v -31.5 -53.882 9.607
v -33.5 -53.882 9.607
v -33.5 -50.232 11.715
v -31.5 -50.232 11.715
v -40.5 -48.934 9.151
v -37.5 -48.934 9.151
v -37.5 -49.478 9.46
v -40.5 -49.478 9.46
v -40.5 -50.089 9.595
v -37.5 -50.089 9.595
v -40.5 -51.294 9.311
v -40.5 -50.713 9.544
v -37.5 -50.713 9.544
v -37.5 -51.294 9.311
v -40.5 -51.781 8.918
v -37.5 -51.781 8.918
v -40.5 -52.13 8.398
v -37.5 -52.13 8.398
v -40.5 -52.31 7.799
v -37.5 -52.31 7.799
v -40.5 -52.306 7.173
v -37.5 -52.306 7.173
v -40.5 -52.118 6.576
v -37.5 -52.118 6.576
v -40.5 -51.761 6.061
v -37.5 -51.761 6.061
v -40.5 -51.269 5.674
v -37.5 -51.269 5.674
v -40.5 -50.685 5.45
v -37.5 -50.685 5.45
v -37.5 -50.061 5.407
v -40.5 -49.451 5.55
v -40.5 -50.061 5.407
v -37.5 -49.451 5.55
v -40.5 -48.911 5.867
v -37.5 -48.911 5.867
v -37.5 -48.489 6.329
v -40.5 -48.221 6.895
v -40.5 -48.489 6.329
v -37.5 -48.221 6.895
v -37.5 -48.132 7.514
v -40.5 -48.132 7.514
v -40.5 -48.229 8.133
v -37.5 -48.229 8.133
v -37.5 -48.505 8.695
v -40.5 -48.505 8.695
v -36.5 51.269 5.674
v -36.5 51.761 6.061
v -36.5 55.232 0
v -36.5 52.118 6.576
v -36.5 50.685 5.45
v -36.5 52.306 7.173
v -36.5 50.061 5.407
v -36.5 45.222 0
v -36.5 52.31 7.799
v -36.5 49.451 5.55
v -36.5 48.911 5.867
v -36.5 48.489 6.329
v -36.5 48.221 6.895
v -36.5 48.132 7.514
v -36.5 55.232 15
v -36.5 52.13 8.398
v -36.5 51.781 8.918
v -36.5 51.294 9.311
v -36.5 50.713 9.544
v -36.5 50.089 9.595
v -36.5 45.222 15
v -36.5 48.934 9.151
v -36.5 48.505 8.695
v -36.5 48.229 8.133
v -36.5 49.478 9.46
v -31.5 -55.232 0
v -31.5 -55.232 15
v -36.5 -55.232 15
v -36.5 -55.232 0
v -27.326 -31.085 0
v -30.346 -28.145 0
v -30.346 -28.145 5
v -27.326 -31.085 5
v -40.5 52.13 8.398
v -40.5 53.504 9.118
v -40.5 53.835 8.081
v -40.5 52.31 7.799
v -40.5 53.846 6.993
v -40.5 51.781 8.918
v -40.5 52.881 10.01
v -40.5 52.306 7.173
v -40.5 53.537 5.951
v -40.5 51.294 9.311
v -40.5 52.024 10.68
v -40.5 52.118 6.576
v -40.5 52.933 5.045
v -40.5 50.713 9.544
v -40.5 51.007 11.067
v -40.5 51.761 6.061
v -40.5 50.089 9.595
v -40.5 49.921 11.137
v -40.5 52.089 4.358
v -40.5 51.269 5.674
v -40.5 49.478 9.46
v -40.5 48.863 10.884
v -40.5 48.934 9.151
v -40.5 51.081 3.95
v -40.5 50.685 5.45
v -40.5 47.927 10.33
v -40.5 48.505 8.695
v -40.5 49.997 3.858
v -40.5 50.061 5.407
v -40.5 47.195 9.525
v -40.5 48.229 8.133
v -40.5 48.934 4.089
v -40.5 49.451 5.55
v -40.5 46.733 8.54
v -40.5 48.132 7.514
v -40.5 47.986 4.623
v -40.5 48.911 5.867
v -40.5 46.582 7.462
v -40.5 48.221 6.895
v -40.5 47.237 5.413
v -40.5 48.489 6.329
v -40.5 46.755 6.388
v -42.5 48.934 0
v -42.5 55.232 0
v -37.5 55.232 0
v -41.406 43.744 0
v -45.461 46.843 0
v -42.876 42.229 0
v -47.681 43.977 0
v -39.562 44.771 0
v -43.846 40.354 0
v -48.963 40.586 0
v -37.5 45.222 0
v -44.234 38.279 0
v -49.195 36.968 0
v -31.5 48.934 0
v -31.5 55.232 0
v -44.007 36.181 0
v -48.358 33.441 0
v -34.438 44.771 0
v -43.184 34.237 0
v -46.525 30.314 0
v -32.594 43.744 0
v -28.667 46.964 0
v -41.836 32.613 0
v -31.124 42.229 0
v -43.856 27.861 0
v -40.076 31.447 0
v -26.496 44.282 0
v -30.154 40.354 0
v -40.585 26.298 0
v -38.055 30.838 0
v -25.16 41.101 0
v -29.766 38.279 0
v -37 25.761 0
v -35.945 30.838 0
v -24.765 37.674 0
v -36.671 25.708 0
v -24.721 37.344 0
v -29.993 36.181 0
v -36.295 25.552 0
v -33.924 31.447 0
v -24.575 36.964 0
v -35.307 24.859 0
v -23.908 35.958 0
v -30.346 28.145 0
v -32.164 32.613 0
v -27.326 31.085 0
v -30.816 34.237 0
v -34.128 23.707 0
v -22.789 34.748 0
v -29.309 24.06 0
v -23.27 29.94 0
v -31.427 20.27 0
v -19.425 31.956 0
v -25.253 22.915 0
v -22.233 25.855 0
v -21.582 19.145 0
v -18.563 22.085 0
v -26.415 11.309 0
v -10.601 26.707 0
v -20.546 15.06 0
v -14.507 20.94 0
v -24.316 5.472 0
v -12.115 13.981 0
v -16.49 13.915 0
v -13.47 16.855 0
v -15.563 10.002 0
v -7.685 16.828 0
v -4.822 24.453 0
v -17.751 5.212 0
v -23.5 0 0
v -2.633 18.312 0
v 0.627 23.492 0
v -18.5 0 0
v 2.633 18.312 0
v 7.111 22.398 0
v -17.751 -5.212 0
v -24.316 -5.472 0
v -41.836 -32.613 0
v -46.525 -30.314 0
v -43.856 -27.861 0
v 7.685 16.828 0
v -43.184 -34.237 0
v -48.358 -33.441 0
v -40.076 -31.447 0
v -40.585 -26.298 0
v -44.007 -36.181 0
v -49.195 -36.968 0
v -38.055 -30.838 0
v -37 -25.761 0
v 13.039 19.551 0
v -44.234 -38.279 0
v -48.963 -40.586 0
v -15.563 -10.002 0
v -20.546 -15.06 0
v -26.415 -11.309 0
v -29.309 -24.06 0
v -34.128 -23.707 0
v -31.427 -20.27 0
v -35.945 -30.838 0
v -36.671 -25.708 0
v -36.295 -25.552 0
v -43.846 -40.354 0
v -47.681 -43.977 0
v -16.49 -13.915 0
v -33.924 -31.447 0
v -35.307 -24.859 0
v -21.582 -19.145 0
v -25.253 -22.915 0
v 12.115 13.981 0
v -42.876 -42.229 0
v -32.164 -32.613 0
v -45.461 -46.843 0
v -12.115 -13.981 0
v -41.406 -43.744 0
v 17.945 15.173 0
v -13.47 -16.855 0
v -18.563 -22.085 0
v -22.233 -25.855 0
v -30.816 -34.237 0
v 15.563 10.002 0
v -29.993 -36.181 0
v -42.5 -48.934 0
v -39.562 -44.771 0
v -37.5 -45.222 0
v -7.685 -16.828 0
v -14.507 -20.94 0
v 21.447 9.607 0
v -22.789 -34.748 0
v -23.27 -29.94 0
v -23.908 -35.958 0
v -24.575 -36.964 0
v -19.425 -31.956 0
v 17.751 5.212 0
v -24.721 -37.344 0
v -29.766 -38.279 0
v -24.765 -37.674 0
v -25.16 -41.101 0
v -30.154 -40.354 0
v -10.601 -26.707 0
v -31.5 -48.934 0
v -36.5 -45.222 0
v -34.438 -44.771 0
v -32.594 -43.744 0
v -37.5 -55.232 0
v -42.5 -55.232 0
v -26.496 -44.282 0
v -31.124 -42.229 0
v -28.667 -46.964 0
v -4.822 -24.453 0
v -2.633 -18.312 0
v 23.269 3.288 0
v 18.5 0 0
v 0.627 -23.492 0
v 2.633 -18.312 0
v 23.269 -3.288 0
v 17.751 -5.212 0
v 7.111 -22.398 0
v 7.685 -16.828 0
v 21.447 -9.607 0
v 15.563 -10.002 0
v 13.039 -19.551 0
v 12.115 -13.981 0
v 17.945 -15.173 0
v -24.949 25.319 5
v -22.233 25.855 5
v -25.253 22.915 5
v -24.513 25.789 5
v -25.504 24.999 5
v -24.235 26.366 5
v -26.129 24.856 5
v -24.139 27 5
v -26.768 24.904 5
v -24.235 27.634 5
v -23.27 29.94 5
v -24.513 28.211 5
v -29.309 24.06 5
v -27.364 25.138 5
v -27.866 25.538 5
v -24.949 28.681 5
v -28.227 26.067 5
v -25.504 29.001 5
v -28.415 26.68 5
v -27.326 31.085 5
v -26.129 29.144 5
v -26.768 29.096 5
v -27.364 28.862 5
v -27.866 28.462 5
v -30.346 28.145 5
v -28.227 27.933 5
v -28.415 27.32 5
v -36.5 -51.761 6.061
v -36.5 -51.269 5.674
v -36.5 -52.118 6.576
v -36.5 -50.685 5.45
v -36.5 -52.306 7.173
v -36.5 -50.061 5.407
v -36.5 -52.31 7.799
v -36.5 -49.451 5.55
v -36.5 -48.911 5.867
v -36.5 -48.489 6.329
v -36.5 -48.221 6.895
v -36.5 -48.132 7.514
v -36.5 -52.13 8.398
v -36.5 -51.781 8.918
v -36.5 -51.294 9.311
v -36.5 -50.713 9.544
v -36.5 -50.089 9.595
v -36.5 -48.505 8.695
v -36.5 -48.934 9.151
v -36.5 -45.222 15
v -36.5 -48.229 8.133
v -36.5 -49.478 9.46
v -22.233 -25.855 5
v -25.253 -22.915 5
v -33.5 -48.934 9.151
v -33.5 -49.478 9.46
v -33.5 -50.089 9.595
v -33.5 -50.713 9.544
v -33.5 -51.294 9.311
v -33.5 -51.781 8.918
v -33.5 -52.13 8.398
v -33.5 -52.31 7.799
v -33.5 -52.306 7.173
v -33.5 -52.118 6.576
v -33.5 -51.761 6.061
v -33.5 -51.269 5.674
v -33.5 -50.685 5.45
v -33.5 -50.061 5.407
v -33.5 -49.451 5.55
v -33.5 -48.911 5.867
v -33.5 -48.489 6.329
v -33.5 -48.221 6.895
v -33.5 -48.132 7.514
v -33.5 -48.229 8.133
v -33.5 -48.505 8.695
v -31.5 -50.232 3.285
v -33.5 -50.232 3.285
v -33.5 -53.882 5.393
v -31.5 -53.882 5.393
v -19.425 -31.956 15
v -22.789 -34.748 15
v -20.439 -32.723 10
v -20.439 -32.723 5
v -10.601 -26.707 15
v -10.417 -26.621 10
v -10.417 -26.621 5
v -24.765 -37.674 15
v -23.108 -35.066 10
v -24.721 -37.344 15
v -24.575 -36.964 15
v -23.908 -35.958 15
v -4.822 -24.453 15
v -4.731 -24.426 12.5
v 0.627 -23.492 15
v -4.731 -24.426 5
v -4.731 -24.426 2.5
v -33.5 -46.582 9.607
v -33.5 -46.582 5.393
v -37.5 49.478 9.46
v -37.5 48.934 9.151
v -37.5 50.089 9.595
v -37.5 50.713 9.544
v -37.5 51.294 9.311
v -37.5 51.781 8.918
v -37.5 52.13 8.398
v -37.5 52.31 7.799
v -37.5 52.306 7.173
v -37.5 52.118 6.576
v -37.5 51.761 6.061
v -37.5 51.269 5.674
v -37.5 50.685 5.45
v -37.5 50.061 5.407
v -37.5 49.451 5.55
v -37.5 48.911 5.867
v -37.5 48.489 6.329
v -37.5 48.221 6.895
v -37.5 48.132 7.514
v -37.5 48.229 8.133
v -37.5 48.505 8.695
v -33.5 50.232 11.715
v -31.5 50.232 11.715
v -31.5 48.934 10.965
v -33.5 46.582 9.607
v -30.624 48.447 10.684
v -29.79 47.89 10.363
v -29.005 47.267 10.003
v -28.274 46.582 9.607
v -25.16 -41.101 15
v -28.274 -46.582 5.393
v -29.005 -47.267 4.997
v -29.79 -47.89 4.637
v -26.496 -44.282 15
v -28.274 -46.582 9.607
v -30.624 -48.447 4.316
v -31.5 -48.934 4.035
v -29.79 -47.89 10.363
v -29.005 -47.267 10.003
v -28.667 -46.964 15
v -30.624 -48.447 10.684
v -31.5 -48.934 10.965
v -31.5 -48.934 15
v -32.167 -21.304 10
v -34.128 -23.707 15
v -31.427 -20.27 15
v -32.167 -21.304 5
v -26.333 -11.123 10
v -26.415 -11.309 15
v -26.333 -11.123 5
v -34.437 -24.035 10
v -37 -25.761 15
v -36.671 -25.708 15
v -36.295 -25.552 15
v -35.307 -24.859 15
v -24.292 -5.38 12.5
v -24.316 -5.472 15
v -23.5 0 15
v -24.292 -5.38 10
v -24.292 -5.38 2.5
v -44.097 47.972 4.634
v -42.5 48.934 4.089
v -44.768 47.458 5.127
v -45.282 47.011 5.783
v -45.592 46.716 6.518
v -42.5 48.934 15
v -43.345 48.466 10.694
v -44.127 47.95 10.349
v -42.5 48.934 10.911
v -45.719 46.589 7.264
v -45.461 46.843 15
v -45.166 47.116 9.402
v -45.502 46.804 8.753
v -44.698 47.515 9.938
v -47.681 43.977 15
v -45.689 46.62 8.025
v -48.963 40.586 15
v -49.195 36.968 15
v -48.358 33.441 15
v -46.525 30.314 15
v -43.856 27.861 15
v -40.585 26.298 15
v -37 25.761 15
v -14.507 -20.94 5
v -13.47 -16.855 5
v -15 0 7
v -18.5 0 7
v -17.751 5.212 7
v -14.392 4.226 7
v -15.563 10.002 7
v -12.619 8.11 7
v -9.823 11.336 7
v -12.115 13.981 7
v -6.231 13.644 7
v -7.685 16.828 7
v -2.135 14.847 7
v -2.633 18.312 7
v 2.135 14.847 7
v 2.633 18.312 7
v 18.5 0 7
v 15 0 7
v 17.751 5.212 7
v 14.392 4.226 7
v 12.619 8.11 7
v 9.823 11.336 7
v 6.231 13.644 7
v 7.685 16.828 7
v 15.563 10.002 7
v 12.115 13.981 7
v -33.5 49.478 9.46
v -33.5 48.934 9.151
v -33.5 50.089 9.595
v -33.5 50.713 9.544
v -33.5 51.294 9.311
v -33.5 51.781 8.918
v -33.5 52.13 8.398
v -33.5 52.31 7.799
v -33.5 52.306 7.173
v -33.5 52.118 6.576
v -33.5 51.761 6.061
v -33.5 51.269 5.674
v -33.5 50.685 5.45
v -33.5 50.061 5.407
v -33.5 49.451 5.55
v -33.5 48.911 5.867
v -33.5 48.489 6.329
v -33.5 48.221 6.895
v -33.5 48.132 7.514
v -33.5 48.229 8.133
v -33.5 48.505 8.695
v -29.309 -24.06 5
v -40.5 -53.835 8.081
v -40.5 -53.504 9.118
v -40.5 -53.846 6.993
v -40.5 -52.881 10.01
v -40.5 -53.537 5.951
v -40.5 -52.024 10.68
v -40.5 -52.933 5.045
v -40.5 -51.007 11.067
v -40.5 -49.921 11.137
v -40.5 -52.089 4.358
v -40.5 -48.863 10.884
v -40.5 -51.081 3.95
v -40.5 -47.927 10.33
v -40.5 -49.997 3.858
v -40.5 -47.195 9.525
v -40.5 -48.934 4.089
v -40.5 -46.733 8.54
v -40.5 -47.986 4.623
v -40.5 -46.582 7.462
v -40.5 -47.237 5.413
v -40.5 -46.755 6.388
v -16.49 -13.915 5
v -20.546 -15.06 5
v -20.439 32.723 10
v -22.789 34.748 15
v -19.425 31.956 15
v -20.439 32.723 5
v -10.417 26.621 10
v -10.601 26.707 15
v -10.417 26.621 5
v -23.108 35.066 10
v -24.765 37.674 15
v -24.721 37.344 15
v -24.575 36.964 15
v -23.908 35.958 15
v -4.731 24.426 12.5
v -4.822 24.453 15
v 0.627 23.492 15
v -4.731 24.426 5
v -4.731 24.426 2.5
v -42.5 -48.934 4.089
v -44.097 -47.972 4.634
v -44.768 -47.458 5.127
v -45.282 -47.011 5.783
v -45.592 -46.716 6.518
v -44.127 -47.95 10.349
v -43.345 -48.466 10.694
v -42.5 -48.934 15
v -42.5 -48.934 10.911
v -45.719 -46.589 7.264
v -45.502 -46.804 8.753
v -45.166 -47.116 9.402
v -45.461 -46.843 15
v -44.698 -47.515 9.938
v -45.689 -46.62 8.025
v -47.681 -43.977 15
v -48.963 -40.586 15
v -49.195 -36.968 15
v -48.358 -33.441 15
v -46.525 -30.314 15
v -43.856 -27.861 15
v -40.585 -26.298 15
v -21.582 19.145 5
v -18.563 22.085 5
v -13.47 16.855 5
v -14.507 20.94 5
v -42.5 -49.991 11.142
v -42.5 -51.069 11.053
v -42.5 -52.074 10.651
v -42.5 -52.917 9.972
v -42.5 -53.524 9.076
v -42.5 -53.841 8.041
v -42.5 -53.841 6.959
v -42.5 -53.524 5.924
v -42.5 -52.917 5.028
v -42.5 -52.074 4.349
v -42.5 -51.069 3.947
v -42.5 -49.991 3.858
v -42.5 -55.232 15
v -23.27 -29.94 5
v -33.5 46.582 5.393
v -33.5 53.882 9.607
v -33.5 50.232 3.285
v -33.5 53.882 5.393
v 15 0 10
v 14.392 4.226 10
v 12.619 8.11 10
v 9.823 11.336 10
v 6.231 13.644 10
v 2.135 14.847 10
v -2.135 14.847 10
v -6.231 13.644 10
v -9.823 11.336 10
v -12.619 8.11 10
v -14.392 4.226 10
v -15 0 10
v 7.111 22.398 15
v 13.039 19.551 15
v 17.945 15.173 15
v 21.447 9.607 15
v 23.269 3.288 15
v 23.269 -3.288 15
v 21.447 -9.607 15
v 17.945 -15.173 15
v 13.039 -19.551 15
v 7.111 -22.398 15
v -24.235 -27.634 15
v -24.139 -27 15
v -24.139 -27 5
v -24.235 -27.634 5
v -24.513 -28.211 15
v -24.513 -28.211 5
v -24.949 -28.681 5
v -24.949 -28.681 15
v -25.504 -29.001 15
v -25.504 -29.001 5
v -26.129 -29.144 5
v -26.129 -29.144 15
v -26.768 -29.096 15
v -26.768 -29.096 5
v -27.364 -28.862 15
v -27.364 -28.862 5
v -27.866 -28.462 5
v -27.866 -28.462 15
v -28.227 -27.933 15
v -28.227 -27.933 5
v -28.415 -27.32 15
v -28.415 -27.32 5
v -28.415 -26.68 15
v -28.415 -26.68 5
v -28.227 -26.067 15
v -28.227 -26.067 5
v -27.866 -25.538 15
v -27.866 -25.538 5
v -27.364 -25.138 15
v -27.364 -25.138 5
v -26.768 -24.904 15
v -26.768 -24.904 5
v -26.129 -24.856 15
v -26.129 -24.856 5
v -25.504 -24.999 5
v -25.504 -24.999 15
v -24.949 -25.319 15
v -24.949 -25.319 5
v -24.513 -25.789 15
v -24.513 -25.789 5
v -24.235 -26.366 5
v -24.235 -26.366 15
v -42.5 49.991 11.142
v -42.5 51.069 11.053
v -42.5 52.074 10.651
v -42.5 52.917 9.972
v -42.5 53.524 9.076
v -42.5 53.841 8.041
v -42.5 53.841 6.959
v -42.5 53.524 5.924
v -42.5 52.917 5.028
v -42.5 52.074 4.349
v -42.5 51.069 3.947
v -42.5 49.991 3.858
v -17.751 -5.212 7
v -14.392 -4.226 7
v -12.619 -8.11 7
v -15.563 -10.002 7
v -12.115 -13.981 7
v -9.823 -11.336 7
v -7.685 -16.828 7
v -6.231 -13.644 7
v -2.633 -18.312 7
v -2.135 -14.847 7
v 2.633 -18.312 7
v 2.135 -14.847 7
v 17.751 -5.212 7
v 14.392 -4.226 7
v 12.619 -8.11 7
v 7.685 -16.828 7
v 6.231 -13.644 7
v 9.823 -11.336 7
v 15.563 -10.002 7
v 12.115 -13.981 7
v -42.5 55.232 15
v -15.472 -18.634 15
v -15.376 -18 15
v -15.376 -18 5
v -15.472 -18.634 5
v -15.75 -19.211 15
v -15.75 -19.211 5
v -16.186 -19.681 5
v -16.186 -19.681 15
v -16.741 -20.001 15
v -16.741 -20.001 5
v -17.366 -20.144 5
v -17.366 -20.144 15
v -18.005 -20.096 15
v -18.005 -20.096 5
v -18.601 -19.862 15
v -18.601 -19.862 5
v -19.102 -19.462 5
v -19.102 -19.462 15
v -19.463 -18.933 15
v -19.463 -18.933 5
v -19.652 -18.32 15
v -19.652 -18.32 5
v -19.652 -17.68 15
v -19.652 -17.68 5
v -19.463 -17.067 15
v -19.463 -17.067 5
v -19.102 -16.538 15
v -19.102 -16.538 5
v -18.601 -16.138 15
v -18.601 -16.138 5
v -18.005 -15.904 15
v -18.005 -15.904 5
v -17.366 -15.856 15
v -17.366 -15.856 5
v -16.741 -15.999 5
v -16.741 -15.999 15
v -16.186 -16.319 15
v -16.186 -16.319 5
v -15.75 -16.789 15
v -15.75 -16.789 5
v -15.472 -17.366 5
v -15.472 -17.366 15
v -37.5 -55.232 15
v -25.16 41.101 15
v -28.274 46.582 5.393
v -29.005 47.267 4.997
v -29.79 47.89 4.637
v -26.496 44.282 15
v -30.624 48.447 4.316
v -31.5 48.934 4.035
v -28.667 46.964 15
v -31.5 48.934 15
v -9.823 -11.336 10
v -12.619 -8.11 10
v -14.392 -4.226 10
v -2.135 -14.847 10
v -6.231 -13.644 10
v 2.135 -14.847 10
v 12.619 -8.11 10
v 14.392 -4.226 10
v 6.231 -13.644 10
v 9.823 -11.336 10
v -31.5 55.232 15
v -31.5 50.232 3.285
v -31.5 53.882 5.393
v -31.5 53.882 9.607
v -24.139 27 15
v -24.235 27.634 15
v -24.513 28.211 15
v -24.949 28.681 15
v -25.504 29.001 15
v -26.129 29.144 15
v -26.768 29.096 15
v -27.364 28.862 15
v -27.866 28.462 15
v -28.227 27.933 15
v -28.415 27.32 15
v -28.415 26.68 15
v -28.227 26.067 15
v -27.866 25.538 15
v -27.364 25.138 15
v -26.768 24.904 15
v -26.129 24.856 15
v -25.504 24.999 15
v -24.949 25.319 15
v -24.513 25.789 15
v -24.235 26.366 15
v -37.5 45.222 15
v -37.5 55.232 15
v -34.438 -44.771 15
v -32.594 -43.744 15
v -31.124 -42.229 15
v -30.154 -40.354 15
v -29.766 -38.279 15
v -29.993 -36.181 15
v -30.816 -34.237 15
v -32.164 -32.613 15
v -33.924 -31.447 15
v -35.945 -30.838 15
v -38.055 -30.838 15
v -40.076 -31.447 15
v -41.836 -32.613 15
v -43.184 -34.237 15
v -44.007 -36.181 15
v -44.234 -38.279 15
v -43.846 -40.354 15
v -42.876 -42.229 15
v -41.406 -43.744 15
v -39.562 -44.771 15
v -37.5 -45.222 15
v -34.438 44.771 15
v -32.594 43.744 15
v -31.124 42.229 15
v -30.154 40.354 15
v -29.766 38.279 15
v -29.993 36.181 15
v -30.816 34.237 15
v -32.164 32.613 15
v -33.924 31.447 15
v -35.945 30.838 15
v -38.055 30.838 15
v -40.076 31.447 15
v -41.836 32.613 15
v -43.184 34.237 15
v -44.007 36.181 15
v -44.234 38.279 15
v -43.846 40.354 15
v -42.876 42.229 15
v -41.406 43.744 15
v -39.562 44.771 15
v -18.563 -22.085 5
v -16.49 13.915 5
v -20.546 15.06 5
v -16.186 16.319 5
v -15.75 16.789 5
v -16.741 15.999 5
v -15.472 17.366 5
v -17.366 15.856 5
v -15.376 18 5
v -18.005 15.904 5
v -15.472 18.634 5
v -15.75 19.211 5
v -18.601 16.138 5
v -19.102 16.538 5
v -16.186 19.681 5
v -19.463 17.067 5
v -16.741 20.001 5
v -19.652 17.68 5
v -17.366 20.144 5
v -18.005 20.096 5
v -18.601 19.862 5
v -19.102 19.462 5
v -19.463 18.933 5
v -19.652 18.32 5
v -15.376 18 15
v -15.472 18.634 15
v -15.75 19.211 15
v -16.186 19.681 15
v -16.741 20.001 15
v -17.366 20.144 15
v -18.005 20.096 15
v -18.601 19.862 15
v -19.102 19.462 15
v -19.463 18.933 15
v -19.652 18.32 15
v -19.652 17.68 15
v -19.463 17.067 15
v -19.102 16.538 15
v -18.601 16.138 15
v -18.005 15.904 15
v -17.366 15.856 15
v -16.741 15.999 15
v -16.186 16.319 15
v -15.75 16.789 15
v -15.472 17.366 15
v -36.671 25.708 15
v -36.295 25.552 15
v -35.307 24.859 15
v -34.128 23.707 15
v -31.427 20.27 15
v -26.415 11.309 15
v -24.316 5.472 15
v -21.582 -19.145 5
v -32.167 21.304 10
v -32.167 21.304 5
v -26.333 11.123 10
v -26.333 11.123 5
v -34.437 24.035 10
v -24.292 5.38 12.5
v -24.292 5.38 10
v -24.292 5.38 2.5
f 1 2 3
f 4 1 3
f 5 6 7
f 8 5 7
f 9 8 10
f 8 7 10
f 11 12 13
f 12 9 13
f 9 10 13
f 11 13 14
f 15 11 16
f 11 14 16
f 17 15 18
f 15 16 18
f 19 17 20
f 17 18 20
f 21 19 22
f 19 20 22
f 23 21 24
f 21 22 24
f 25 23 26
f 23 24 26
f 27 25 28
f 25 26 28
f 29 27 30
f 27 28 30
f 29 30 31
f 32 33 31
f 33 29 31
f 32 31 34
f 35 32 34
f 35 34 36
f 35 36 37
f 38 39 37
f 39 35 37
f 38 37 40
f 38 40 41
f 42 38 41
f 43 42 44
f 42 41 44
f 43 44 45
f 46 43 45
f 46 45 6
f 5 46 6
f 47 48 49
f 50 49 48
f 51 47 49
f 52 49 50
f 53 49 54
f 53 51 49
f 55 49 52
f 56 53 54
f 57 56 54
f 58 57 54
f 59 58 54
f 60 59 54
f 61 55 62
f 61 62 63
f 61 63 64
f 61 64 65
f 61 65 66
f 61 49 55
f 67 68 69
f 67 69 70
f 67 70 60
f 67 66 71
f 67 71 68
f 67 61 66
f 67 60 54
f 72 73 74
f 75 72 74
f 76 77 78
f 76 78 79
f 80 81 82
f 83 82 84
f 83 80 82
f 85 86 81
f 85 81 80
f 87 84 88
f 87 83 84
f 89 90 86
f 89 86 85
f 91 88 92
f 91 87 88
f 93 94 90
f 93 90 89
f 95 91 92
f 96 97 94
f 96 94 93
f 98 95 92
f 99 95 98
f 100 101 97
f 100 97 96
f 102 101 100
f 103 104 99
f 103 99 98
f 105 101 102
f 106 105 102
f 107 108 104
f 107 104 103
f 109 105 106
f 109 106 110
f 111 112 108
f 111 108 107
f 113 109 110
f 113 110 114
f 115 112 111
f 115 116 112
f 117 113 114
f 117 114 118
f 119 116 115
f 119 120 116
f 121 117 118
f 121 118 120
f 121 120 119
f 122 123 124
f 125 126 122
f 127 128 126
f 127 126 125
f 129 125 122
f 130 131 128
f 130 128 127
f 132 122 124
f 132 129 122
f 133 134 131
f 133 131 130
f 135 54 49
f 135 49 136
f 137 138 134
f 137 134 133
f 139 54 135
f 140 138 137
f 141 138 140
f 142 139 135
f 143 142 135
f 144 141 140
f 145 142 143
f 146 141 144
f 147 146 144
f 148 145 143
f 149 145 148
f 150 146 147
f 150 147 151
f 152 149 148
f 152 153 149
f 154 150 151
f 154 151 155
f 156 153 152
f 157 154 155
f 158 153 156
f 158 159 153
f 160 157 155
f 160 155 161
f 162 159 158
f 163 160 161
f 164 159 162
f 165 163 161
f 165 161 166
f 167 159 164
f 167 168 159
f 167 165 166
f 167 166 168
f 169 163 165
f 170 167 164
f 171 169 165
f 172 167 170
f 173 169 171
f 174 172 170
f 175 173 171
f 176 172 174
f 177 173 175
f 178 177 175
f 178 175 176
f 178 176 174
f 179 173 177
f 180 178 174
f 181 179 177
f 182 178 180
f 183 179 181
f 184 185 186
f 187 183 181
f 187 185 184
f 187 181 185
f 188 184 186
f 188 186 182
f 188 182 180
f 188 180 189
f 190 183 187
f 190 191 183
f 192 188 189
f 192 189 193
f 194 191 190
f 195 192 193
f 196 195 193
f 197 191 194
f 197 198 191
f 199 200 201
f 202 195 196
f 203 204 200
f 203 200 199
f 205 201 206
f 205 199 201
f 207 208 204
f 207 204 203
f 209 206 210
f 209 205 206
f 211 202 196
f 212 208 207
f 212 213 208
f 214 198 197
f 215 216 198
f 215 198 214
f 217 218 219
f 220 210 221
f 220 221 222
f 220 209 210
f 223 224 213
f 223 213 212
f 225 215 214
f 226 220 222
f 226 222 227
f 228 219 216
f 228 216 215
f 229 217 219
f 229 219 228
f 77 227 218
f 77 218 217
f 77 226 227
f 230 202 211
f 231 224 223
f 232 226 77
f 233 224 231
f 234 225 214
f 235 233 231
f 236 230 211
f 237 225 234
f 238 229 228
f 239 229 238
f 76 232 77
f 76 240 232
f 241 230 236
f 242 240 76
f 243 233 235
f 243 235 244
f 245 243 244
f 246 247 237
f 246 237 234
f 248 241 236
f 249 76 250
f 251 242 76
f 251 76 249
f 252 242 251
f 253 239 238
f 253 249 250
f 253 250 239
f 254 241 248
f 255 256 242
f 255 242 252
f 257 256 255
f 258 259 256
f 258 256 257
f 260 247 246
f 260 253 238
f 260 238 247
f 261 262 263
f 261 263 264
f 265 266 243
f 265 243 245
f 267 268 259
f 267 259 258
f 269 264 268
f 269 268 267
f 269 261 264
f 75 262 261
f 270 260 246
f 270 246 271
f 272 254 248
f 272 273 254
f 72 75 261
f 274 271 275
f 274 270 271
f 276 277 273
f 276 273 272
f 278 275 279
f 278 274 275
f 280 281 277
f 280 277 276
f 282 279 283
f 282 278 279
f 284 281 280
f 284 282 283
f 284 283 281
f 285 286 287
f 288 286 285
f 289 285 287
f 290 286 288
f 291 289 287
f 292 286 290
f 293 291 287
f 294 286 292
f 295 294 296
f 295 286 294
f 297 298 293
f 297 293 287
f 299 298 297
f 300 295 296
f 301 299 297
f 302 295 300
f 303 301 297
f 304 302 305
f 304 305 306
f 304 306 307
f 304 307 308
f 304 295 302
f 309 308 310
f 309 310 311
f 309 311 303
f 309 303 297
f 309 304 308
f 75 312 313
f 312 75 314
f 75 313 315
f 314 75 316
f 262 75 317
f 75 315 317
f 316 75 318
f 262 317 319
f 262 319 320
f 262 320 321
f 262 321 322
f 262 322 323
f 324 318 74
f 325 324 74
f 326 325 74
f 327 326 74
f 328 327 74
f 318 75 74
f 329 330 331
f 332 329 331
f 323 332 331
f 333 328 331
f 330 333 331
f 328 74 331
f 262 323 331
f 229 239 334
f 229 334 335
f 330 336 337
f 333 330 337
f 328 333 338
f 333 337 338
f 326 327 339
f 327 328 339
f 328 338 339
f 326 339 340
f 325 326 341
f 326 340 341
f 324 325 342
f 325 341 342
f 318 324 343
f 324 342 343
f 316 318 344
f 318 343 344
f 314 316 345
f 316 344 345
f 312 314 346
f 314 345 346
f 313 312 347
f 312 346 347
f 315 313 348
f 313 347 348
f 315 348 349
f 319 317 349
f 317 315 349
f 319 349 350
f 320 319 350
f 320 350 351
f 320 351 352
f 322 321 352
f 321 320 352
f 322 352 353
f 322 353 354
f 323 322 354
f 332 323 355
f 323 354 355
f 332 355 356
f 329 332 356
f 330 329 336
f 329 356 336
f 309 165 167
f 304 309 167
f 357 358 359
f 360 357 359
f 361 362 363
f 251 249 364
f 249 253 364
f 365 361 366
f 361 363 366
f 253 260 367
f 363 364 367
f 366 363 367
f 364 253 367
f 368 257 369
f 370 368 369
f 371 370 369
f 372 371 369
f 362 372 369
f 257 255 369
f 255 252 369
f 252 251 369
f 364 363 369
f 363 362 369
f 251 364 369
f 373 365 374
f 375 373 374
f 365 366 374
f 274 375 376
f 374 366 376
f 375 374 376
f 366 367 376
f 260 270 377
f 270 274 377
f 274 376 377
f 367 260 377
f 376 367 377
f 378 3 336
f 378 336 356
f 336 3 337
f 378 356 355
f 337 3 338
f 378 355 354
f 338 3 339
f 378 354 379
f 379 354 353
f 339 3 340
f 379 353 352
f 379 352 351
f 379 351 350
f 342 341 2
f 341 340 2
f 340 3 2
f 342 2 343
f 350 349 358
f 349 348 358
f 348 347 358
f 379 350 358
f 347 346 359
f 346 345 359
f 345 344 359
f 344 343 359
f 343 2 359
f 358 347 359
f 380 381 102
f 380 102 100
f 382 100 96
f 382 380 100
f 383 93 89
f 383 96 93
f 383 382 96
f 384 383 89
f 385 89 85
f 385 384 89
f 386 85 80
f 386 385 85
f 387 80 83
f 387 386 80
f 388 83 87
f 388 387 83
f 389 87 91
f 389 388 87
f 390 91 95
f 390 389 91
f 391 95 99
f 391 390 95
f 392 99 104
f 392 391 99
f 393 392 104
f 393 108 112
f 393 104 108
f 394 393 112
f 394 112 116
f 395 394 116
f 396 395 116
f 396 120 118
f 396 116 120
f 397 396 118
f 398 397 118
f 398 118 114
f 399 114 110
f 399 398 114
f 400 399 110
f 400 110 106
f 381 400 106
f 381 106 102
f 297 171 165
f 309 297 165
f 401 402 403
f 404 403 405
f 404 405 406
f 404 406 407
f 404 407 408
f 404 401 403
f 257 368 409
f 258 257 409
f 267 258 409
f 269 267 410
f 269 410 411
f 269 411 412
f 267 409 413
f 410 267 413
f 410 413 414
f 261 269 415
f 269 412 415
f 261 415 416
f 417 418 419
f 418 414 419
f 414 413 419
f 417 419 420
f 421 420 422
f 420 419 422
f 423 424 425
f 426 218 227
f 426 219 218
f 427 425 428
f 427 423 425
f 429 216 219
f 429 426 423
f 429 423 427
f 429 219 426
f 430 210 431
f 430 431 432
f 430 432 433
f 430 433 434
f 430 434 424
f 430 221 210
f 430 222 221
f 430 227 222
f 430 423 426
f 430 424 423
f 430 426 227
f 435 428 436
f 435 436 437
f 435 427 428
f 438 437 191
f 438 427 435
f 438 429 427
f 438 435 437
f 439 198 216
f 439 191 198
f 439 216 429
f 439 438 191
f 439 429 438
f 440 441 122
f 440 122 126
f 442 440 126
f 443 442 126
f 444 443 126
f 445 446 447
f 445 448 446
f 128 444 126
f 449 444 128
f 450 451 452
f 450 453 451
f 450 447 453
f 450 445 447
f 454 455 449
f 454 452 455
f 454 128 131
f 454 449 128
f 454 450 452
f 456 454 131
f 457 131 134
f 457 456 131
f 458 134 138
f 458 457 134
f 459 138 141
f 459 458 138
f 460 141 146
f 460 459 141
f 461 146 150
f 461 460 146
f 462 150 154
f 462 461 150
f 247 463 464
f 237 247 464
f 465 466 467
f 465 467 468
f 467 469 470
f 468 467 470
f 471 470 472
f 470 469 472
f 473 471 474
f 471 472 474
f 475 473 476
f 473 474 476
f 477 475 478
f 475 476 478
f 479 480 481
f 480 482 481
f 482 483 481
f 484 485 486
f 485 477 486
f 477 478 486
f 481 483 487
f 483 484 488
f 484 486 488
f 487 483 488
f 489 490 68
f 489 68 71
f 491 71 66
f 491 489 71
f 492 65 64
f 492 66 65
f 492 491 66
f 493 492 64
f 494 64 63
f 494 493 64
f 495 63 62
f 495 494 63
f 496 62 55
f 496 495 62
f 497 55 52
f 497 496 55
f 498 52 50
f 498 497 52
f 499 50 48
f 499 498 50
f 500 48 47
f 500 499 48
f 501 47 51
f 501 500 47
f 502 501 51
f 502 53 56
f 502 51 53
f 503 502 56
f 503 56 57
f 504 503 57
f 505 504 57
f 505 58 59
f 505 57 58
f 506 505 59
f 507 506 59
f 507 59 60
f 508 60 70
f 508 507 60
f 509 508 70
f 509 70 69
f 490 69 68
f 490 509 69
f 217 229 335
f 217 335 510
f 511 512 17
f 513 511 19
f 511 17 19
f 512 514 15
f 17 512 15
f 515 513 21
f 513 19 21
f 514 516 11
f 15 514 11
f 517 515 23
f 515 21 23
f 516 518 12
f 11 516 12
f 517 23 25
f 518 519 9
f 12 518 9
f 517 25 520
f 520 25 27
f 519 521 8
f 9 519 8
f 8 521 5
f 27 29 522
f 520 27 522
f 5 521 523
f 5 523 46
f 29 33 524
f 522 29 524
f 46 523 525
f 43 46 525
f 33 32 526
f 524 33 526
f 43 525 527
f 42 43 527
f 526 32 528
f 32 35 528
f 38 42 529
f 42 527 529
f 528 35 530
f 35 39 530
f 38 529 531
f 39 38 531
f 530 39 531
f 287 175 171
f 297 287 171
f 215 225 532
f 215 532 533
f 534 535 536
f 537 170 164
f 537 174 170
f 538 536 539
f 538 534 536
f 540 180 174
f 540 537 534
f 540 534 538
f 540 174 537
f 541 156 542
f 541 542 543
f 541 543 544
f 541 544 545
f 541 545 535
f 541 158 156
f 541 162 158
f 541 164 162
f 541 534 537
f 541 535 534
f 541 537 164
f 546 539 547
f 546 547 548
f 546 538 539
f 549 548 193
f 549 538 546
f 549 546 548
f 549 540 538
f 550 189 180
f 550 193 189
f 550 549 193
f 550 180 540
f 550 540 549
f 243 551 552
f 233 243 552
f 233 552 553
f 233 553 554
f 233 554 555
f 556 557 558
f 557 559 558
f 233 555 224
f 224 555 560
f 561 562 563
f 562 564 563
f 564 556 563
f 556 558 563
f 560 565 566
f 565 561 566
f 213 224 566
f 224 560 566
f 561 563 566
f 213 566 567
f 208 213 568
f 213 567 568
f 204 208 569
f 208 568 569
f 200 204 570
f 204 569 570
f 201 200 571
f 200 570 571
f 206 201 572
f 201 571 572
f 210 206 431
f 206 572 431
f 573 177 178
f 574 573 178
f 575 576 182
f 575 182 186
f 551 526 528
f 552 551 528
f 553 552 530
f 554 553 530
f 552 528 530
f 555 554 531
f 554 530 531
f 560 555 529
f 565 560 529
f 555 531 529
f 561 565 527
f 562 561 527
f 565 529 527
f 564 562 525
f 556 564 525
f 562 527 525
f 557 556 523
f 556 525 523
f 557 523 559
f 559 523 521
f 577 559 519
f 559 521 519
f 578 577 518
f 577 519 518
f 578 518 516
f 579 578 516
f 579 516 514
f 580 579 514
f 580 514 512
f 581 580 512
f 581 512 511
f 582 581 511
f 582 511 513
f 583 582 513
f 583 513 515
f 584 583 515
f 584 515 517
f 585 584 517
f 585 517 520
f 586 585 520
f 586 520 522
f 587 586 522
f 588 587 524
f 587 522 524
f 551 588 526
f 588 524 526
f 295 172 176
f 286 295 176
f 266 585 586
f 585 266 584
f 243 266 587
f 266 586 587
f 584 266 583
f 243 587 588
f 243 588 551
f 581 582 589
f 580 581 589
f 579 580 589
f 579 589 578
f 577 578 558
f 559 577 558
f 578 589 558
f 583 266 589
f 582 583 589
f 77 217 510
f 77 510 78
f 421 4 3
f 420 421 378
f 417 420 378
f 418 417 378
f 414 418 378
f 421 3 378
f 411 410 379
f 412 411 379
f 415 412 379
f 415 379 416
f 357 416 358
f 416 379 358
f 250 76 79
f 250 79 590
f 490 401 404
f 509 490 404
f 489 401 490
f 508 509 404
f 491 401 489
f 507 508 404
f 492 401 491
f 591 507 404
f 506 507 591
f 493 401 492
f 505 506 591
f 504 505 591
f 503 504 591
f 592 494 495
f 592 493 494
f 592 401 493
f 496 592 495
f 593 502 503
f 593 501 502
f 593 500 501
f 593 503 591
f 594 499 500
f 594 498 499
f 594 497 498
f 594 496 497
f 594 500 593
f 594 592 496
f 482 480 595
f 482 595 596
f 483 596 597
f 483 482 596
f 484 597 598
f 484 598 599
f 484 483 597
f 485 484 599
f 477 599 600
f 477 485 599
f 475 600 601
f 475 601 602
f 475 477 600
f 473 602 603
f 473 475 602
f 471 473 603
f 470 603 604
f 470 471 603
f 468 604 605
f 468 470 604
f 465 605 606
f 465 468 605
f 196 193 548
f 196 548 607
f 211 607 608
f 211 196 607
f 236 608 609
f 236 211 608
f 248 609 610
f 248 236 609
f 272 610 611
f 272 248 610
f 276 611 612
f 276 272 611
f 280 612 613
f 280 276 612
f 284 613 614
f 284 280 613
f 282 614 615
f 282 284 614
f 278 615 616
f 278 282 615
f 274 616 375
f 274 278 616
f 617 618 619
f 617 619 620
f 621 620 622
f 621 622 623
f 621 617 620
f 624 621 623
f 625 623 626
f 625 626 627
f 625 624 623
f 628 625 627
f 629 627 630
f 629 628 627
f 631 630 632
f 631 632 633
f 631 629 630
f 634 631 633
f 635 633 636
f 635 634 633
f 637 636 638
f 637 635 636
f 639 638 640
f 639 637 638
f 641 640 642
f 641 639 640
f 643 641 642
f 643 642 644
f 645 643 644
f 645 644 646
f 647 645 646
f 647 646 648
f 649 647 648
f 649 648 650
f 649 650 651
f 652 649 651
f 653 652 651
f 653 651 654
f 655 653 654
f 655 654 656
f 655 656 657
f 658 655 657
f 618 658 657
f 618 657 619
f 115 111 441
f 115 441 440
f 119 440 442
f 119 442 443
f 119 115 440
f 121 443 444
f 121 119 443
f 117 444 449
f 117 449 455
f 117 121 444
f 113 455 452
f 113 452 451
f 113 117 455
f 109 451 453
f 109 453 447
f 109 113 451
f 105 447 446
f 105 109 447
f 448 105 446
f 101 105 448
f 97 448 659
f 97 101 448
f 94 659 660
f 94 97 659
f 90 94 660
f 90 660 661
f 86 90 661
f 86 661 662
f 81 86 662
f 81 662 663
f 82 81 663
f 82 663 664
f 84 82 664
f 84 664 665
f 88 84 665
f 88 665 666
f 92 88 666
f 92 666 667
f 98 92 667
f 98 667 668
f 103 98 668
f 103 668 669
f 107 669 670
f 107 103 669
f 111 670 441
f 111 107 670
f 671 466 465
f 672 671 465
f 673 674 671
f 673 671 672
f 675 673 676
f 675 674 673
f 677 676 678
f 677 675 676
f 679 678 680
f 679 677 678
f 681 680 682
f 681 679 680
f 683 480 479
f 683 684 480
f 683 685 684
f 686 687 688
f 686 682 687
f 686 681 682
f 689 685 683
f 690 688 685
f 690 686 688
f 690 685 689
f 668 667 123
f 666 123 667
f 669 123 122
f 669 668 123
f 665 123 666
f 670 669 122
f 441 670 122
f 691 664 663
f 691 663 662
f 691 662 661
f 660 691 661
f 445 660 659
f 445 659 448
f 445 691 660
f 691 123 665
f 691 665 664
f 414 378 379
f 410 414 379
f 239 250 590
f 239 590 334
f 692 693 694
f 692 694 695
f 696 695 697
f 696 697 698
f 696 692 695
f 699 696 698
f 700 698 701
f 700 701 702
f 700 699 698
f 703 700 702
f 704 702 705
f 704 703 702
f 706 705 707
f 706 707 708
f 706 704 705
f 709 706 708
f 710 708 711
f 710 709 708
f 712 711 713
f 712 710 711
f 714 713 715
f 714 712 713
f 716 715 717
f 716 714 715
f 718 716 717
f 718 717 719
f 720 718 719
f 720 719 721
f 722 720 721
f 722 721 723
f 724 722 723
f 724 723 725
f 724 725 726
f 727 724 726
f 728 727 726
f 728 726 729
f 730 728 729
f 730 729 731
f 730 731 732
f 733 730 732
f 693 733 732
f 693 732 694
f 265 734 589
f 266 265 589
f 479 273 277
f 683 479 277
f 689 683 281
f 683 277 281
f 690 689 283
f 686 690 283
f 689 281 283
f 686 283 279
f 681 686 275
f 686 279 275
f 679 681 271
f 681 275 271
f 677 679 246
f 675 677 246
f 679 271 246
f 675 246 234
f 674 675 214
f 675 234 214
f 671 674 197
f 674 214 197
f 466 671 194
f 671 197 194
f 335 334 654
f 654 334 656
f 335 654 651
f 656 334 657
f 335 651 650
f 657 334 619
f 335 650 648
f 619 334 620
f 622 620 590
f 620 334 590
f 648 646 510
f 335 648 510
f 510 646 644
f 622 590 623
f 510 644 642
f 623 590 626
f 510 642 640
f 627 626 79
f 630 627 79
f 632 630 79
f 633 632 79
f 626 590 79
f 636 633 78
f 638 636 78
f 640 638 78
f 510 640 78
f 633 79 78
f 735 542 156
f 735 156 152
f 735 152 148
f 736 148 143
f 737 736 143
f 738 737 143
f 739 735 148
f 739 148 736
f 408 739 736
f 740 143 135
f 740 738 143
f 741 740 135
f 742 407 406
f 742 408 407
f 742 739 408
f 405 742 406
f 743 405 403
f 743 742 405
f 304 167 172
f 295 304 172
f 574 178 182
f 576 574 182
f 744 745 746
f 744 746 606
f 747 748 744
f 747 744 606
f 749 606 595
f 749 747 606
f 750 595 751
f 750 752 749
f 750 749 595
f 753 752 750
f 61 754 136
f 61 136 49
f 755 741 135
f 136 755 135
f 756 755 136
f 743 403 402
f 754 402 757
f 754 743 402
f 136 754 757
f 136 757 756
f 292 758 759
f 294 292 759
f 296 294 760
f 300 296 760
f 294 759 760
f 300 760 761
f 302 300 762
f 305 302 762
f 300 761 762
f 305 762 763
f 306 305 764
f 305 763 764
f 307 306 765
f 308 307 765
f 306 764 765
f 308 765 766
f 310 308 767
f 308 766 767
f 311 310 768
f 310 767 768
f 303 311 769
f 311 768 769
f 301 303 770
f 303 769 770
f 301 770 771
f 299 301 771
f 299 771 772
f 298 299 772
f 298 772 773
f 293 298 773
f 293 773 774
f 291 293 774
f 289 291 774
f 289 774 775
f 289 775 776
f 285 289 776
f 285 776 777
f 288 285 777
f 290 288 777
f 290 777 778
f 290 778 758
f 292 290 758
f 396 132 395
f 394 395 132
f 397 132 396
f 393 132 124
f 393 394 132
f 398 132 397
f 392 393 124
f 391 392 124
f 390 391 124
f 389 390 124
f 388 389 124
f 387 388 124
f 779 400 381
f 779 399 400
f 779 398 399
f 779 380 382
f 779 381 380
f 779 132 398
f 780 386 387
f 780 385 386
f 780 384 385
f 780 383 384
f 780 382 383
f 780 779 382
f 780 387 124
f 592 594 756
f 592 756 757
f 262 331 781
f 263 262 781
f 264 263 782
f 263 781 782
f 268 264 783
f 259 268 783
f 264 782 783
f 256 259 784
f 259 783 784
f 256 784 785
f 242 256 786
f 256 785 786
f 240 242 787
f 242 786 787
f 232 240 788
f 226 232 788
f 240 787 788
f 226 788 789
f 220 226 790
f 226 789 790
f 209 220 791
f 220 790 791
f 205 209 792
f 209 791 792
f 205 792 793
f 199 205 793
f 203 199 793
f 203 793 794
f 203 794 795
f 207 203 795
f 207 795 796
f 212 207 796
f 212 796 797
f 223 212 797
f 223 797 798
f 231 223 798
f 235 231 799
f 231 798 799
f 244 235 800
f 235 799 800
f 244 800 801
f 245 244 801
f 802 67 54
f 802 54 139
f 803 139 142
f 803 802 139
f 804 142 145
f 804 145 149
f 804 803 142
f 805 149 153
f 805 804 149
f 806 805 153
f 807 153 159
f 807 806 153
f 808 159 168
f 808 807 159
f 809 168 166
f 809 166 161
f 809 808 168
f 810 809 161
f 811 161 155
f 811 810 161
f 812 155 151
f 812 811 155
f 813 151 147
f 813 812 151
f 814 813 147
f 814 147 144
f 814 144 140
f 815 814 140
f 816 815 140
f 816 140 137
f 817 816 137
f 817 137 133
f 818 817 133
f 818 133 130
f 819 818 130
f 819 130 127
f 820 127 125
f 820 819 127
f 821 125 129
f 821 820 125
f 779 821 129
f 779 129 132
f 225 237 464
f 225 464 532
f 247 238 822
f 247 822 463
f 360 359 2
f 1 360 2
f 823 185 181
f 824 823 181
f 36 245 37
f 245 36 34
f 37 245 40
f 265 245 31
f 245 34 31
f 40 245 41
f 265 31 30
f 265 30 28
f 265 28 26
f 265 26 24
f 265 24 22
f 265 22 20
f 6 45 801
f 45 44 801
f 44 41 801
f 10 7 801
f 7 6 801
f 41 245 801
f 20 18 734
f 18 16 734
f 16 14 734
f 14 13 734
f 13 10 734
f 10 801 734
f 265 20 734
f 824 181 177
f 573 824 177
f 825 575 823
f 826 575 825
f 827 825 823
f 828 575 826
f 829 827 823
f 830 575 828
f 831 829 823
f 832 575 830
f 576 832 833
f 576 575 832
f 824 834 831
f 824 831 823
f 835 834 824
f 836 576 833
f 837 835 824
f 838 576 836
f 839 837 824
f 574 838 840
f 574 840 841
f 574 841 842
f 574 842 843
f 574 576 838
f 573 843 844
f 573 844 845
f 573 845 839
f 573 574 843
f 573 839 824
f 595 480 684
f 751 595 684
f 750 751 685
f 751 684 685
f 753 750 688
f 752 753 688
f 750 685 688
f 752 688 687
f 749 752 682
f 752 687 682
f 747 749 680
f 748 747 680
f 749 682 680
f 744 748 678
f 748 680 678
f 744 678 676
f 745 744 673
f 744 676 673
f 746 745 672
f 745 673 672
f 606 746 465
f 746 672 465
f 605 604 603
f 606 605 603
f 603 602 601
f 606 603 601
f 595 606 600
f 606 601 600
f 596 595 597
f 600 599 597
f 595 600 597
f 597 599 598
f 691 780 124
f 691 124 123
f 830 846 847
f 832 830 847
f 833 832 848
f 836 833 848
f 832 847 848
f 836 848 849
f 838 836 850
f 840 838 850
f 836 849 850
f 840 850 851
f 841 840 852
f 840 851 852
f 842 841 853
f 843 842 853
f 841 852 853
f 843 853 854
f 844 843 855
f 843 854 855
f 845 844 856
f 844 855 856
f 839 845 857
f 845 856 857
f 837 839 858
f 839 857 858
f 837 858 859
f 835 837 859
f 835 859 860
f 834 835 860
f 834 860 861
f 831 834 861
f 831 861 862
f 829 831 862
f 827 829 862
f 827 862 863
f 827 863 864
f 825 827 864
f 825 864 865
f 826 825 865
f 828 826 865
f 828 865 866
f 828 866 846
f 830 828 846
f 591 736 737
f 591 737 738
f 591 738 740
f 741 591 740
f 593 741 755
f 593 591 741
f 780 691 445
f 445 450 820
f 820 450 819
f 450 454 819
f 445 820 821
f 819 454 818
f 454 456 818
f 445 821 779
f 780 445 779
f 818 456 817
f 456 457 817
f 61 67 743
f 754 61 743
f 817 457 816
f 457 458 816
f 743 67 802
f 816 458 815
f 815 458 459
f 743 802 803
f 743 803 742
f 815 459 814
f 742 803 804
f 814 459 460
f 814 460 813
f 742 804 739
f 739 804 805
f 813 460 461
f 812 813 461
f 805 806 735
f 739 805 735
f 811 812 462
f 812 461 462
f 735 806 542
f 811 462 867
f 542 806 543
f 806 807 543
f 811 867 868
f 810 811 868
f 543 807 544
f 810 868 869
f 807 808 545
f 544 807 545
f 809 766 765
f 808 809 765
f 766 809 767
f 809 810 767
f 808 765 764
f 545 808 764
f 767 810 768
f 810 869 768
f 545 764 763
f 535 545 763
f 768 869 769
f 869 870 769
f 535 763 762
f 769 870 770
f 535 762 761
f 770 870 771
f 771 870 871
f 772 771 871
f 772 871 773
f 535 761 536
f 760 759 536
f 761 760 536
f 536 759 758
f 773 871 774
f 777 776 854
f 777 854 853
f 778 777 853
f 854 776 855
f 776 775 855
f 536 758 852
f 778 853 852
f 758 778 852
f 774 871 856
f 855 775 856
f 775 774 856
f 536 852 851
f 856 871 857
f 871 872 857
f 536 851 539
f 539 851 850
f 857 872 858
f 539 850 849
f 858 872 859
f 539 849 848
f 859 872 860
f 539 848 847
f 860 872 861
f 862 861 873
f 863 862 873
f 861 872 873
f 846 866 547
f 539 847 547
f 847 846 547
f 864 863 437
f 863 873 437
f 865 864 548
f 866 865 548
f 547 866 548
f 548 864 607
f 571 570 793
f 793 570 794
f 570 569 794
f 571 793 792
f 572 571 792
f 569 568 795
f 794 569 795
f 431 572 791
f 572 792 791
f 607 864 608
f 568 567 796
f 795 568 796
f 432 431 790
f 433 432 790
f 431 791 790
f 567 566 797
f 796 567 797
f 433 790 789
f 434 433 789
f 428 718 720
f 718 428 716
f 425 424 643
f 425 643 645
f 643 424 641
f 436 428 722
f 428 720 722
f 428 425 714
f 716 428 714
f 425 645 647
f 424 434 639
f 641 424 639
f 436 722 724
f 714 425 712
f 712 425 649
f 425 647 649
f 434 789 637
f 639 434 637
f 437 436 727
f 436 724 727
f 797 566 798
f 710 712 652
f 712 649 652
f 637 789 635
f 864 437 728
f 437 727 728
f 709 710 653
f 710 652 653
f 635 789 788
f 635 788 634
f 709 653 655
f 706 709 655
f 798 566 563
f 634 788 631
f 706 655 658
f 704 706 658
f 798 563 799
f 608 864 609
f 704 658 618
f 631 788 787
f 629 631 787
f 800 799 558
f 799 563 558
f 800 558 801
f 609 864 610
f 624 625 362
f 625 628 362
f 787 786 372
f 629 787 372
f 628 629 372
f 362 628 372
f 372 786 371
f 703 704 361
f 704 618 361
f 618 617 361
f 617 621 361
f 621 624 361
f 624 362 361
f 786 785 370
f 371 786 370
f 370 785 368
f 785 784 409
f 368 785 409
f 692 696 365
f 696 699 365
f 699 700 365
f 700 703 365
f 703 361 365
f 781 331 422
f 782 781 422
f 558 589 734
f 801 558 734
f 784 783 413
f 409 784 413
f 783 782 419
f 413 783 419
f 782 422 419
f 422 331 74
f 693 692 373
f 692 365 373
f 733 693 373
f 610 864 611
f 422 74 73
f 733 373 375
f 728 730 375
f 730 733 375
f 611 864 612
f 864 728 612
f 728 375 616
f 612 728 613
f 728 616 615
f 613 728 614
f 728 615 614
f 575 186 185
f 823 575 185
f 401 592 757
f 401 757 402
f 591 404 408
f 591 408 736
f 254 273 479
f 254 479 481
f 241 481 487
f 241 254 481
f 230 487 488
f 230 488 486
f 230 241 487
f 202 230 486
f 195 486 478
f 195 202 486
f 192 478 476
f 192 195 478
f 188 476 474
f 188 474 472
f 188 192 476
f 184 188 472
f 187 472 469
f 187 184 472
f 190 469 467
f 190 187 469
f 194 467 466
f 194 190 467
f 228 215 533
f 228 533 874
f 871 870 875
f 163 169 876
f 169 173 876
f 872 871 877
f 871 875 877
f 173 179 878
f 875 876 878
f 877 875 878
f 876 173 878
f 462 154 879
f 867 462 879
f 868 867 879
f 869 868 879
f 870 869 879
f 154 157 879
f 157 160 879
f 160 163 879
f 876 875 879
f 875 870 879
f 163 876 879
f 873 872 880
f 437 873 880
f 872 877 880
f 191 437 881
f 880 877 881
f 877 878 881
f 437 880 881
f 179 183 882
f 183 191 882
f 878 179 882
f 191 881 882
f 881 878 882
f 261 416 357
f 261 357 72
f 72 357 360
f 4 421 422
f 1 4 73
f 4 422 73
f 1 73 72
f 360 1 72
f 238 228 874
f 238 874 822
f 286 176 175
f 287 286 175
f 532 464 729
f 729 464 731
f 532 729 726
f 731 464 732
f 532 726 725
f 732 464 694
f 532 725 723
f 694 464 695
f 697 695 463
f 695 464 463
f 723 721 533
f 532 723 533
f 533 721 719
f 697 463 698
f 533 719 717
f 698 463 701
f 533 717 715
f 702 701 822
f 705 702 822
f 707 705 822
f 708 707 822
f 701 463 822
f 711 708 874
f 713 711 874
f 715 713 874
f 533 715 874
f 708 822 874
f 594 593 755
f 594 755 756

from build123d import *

# Parameters (mm, degrees)
SKETCH1_R               = 23.5
SKETCH1_R_2             = 18.5
BOSS_EXTRUDE1_DEPTH     = 7
SKETCH2_R               = 23.5
SKETCH2_R_2             = 15
BOSS_EXTRUDE2_DEPTH     = 3
SKETCH3_R               = 23.5
BOSS_EXTRUDE3_DEPTH     = 5
BOSS_EXTRUDE4_DEPTH     = 15
CUT_EXTRUDE1_DEPTH      = 88.358719822
CUT_EXTRUDE1_DEPTH_BACK = 88.358719822
SKETCH5_R               = 2.1
CUT_EXTRUDE2_DEPTH      = 88.35871984
CUT_EXTRUDE2_DEPTH_BACK = 2
SKETCH6_R               = 3.65
CUT_EXTRUDE3_DEPTH      = 80.375978306
CUT_EXTRUDE3_DEPTH_BACK = 2
BOSS_EXTRUDE6_START     = -15
BOSS_EXTRUDE6_DEPTH     = 15
SKETCH9_R               = 2.15
CUT_EXTRUDE4_DEPTH      = 15
CUT_EXTRUDE5_DEPTH      = 5
SKETCH11_W              = 94.20005325
SKETCH11_H              = 33.320618951
CUT_EXTRUDE6_DEPTH      = 25


# Read off the part's stored shape, not the designer's step: Boss-Extrude6
with BuildPart() as part:
    # Sketch1 → Boss-Extrude1 (new body)
    with BuildSketch(Plane.XY):
        Circle(SKETCH1_R)
        Circle(SKETCH1_R_2, mode=Mode.SUBTRACT)
    extrude(amount=BOSS_EXTRUDE1_DEPTH)

    # Sketch2 → Boss-Extrude2 (add)
    with BuildSketch(Plane.XY.offset(7)):
        Circle(SKETCH2_R)
        Circle(SKETCH2_R_2, mode=Mode.SUBTRACT)
    extrude(amount=BOSS_EXTRUDE2_DEPTH)

    # Sketch3 → Boss-Extrude3 (add)
    with BuildSketch(Plane.XY.offset(10)):
        Circle(SKETCH3_R)
    extrude(amount=BOSS_EXTRUDE3_DEPTH)



with BuildPart() as body_2:
    # Sketch4 → Boss-Extrude4 (new body)
    with BuildSketch(Plane.XY.offset(15)):
        with BuildLine():
            Line((-37.5, 45.221711778), (-37.5, 55.231747474))
            Line((-37.5, 55.231747474), (-42.5, 55.231747474))
            Line((-42.5, 55.231747474), (-42.5, 48.933577685))
            ThreePointArc((-42.5, 48.933577685), (-37, 25.761), (-31.5, 48.933577685))
            Line((-31.5, 48.933577685), (-31.5, 55.231747474))
            Line((-31.5, 55.231747474), (-36.5, 55.231747474))
            Line((-36.5, 55.231747474), (-36.5, 45.221711778))
            ThreePointArc((-36.5, 45.221711778), (-37, 30.761), (-37.5, 45.221711778))
        make_face()
    extrude(amount=-BOSS_EXTRUDE4_DEPTH)

    # Sketch5 → Cut-Extrude1 (cut, two sides: drawn at the far end of the back side and taken through both)
    with BuildSketch(Plane.ZY.offset(42.5).offset(-CUT_EXTRUDE1_DEPTH_BACK)):
        with Locations(Location((7.5, 50.231747474, 0), (0, 0, 321.816935122))):
            Circle(SKETCH5_R)
    extrude(amount=CUT_EXTRUDE1_DEPTH + CUT_EXTRUDE1_DEPTH_BACK, mode=Mode.SUBTRACT)

    # Sketch6 → Cut-Extrude2 (cut, two sides: drawn at the far end of the back side and taken through both)
    with BuildSketch(Plane.ZY.offset(42.5).offset(-CUT_EXTRUDE2_DEPTH_BACK)):
        with Locations(Location((7.5, 50.231747474, 0), (0, 0, 200.834080871))):
            Circle(SKETCH6_R)
    extrude(amount=CUT_EXTRUDE2_DEPTH + CUT_EXTRUDE2_DEPTH_BACK, mode=Mode.SUBTRACT)

    # Sketch7 → Cut-Extrude3 (cut, two sides: drawn at the far end of the back side and taken through both)
    with BuildSketch(Plane(origin=(-31.5, 0, 0), x_dir=(0, 0, -1), z_dir=(1, 0, 0)).offset(-CUT_EXTRUDE3_DEPTH_BACK)):
        Polygon((-5.392671517, 53.881747474), (-9.607328483, 53.881747474), (-11.714656965, 50.231747474), (-9.607328483, 46.581747474), (-5.392671517, 46.581747474), (-3.285343035, 50.231747474), align=None)
    extrude(amount=CUT_EXTRUDE3_DEPTH + CUT_EXTRUDE3_DEPTH_BACK, mode=Mode.SUBTRACT)


with BuildPart() as part_1:
    add(part.part)

    add(body_2.part)  # Boss-Extrude6 merges body 2
    # Boss-Extrude6 outline → Boss-Extrude6 (add)
    with BuildSketch(Plane.XY.offset(15).offset(BOSS_EXTRUDE6_START)):
        with BuildLine():
            ThreePointArc((-24.765350871, 37.673684678), (-28.461869415, 29.231109129), (-37, 25.761))
            add(Edge.make_bspline(
                [(-37, 25.761), (-34, 25.761), (-23.5, 10), (-23.5, 0)],
                knots=[0, 0, 0, 0, 1, 1, 1, 1], degree=3))
            ThreePointArc((-23.5, 0), (-16.393992054, 16.83707292), (0.626555279, 23.49164593))
            add(Edge.make_bspline(
                [(-24.765350871, 37.673684678), (-24.845336651, 34.674751155), (-9.369889797, 23.758265197), (0.626555279, 23.49164593)],
                knots=[0, 0, 0, 0, 1, 1, 1, 1], degree=3))
        make_face()
    extrude(amount=BOSS_EXTRUDE6_DEPTH)

    # Sketch9 → Cut-Extrude4 (cut)
    with BuildSketch(Plane.XY.offset(15)):
        with Locations((-17.526315789, 18)):
            Circle(SKETCH9_R)
        with Locations((-26.289473684, 27)):
            Circle(SKETCH9_R)
    extrude(amount=-CUT_EXTRUDE4_DEPTH, mode=Mode.SUBTRACT)

    # Sketch10 → Cut-Extrude5 (cut)
    with BuildSketch(Plane(origin=(0, 0, 0), x_dir=(-1, 0, 0), z_dir=(0, 0, -1))):
        Polygon((25.253012932, 22.914772657), (29.309153967, 24.059784987), (30.345614719, 28.14501233), (27.325934436, 31.085227343), (23.269793401, 29.940215013), (22.233332649, 25.85498767), align=None)
        Polygon((16.489855038, 13.914772657), (20.545996073, 15.059784987), (21.582456825, 19.14501233), (18.562776541, 22.085227343), (14.506635506, 20.940215013), (13.470174754, 16.85498767), align=None)
    extrude(amount=-CUT_EXTRUDE5_DEPTH, mode=Mode.SUBTRACT)

    # Sketch11 → Cut-Extrude6 (cut)
    with BuildSketch(Plane(origin=(0, 0, 0), x_dir=(1, 0, 0), z_dir=(0, 1, 0))):
        with Locations((-10.776769446, -9.973227019)):
            Rectangle(SKETCH11_W, SKETCH11_H)
    extrude(amount=-CUT_EXTRUDE6_DEPTH, mode=Mode.SUBTRACT)

    # Mirror4: part across plane


with BuildPart() as part_2:
    add(part_1.part)
    add(part_1.part.mirror(Plane.ZX))


solid = part_2.part
